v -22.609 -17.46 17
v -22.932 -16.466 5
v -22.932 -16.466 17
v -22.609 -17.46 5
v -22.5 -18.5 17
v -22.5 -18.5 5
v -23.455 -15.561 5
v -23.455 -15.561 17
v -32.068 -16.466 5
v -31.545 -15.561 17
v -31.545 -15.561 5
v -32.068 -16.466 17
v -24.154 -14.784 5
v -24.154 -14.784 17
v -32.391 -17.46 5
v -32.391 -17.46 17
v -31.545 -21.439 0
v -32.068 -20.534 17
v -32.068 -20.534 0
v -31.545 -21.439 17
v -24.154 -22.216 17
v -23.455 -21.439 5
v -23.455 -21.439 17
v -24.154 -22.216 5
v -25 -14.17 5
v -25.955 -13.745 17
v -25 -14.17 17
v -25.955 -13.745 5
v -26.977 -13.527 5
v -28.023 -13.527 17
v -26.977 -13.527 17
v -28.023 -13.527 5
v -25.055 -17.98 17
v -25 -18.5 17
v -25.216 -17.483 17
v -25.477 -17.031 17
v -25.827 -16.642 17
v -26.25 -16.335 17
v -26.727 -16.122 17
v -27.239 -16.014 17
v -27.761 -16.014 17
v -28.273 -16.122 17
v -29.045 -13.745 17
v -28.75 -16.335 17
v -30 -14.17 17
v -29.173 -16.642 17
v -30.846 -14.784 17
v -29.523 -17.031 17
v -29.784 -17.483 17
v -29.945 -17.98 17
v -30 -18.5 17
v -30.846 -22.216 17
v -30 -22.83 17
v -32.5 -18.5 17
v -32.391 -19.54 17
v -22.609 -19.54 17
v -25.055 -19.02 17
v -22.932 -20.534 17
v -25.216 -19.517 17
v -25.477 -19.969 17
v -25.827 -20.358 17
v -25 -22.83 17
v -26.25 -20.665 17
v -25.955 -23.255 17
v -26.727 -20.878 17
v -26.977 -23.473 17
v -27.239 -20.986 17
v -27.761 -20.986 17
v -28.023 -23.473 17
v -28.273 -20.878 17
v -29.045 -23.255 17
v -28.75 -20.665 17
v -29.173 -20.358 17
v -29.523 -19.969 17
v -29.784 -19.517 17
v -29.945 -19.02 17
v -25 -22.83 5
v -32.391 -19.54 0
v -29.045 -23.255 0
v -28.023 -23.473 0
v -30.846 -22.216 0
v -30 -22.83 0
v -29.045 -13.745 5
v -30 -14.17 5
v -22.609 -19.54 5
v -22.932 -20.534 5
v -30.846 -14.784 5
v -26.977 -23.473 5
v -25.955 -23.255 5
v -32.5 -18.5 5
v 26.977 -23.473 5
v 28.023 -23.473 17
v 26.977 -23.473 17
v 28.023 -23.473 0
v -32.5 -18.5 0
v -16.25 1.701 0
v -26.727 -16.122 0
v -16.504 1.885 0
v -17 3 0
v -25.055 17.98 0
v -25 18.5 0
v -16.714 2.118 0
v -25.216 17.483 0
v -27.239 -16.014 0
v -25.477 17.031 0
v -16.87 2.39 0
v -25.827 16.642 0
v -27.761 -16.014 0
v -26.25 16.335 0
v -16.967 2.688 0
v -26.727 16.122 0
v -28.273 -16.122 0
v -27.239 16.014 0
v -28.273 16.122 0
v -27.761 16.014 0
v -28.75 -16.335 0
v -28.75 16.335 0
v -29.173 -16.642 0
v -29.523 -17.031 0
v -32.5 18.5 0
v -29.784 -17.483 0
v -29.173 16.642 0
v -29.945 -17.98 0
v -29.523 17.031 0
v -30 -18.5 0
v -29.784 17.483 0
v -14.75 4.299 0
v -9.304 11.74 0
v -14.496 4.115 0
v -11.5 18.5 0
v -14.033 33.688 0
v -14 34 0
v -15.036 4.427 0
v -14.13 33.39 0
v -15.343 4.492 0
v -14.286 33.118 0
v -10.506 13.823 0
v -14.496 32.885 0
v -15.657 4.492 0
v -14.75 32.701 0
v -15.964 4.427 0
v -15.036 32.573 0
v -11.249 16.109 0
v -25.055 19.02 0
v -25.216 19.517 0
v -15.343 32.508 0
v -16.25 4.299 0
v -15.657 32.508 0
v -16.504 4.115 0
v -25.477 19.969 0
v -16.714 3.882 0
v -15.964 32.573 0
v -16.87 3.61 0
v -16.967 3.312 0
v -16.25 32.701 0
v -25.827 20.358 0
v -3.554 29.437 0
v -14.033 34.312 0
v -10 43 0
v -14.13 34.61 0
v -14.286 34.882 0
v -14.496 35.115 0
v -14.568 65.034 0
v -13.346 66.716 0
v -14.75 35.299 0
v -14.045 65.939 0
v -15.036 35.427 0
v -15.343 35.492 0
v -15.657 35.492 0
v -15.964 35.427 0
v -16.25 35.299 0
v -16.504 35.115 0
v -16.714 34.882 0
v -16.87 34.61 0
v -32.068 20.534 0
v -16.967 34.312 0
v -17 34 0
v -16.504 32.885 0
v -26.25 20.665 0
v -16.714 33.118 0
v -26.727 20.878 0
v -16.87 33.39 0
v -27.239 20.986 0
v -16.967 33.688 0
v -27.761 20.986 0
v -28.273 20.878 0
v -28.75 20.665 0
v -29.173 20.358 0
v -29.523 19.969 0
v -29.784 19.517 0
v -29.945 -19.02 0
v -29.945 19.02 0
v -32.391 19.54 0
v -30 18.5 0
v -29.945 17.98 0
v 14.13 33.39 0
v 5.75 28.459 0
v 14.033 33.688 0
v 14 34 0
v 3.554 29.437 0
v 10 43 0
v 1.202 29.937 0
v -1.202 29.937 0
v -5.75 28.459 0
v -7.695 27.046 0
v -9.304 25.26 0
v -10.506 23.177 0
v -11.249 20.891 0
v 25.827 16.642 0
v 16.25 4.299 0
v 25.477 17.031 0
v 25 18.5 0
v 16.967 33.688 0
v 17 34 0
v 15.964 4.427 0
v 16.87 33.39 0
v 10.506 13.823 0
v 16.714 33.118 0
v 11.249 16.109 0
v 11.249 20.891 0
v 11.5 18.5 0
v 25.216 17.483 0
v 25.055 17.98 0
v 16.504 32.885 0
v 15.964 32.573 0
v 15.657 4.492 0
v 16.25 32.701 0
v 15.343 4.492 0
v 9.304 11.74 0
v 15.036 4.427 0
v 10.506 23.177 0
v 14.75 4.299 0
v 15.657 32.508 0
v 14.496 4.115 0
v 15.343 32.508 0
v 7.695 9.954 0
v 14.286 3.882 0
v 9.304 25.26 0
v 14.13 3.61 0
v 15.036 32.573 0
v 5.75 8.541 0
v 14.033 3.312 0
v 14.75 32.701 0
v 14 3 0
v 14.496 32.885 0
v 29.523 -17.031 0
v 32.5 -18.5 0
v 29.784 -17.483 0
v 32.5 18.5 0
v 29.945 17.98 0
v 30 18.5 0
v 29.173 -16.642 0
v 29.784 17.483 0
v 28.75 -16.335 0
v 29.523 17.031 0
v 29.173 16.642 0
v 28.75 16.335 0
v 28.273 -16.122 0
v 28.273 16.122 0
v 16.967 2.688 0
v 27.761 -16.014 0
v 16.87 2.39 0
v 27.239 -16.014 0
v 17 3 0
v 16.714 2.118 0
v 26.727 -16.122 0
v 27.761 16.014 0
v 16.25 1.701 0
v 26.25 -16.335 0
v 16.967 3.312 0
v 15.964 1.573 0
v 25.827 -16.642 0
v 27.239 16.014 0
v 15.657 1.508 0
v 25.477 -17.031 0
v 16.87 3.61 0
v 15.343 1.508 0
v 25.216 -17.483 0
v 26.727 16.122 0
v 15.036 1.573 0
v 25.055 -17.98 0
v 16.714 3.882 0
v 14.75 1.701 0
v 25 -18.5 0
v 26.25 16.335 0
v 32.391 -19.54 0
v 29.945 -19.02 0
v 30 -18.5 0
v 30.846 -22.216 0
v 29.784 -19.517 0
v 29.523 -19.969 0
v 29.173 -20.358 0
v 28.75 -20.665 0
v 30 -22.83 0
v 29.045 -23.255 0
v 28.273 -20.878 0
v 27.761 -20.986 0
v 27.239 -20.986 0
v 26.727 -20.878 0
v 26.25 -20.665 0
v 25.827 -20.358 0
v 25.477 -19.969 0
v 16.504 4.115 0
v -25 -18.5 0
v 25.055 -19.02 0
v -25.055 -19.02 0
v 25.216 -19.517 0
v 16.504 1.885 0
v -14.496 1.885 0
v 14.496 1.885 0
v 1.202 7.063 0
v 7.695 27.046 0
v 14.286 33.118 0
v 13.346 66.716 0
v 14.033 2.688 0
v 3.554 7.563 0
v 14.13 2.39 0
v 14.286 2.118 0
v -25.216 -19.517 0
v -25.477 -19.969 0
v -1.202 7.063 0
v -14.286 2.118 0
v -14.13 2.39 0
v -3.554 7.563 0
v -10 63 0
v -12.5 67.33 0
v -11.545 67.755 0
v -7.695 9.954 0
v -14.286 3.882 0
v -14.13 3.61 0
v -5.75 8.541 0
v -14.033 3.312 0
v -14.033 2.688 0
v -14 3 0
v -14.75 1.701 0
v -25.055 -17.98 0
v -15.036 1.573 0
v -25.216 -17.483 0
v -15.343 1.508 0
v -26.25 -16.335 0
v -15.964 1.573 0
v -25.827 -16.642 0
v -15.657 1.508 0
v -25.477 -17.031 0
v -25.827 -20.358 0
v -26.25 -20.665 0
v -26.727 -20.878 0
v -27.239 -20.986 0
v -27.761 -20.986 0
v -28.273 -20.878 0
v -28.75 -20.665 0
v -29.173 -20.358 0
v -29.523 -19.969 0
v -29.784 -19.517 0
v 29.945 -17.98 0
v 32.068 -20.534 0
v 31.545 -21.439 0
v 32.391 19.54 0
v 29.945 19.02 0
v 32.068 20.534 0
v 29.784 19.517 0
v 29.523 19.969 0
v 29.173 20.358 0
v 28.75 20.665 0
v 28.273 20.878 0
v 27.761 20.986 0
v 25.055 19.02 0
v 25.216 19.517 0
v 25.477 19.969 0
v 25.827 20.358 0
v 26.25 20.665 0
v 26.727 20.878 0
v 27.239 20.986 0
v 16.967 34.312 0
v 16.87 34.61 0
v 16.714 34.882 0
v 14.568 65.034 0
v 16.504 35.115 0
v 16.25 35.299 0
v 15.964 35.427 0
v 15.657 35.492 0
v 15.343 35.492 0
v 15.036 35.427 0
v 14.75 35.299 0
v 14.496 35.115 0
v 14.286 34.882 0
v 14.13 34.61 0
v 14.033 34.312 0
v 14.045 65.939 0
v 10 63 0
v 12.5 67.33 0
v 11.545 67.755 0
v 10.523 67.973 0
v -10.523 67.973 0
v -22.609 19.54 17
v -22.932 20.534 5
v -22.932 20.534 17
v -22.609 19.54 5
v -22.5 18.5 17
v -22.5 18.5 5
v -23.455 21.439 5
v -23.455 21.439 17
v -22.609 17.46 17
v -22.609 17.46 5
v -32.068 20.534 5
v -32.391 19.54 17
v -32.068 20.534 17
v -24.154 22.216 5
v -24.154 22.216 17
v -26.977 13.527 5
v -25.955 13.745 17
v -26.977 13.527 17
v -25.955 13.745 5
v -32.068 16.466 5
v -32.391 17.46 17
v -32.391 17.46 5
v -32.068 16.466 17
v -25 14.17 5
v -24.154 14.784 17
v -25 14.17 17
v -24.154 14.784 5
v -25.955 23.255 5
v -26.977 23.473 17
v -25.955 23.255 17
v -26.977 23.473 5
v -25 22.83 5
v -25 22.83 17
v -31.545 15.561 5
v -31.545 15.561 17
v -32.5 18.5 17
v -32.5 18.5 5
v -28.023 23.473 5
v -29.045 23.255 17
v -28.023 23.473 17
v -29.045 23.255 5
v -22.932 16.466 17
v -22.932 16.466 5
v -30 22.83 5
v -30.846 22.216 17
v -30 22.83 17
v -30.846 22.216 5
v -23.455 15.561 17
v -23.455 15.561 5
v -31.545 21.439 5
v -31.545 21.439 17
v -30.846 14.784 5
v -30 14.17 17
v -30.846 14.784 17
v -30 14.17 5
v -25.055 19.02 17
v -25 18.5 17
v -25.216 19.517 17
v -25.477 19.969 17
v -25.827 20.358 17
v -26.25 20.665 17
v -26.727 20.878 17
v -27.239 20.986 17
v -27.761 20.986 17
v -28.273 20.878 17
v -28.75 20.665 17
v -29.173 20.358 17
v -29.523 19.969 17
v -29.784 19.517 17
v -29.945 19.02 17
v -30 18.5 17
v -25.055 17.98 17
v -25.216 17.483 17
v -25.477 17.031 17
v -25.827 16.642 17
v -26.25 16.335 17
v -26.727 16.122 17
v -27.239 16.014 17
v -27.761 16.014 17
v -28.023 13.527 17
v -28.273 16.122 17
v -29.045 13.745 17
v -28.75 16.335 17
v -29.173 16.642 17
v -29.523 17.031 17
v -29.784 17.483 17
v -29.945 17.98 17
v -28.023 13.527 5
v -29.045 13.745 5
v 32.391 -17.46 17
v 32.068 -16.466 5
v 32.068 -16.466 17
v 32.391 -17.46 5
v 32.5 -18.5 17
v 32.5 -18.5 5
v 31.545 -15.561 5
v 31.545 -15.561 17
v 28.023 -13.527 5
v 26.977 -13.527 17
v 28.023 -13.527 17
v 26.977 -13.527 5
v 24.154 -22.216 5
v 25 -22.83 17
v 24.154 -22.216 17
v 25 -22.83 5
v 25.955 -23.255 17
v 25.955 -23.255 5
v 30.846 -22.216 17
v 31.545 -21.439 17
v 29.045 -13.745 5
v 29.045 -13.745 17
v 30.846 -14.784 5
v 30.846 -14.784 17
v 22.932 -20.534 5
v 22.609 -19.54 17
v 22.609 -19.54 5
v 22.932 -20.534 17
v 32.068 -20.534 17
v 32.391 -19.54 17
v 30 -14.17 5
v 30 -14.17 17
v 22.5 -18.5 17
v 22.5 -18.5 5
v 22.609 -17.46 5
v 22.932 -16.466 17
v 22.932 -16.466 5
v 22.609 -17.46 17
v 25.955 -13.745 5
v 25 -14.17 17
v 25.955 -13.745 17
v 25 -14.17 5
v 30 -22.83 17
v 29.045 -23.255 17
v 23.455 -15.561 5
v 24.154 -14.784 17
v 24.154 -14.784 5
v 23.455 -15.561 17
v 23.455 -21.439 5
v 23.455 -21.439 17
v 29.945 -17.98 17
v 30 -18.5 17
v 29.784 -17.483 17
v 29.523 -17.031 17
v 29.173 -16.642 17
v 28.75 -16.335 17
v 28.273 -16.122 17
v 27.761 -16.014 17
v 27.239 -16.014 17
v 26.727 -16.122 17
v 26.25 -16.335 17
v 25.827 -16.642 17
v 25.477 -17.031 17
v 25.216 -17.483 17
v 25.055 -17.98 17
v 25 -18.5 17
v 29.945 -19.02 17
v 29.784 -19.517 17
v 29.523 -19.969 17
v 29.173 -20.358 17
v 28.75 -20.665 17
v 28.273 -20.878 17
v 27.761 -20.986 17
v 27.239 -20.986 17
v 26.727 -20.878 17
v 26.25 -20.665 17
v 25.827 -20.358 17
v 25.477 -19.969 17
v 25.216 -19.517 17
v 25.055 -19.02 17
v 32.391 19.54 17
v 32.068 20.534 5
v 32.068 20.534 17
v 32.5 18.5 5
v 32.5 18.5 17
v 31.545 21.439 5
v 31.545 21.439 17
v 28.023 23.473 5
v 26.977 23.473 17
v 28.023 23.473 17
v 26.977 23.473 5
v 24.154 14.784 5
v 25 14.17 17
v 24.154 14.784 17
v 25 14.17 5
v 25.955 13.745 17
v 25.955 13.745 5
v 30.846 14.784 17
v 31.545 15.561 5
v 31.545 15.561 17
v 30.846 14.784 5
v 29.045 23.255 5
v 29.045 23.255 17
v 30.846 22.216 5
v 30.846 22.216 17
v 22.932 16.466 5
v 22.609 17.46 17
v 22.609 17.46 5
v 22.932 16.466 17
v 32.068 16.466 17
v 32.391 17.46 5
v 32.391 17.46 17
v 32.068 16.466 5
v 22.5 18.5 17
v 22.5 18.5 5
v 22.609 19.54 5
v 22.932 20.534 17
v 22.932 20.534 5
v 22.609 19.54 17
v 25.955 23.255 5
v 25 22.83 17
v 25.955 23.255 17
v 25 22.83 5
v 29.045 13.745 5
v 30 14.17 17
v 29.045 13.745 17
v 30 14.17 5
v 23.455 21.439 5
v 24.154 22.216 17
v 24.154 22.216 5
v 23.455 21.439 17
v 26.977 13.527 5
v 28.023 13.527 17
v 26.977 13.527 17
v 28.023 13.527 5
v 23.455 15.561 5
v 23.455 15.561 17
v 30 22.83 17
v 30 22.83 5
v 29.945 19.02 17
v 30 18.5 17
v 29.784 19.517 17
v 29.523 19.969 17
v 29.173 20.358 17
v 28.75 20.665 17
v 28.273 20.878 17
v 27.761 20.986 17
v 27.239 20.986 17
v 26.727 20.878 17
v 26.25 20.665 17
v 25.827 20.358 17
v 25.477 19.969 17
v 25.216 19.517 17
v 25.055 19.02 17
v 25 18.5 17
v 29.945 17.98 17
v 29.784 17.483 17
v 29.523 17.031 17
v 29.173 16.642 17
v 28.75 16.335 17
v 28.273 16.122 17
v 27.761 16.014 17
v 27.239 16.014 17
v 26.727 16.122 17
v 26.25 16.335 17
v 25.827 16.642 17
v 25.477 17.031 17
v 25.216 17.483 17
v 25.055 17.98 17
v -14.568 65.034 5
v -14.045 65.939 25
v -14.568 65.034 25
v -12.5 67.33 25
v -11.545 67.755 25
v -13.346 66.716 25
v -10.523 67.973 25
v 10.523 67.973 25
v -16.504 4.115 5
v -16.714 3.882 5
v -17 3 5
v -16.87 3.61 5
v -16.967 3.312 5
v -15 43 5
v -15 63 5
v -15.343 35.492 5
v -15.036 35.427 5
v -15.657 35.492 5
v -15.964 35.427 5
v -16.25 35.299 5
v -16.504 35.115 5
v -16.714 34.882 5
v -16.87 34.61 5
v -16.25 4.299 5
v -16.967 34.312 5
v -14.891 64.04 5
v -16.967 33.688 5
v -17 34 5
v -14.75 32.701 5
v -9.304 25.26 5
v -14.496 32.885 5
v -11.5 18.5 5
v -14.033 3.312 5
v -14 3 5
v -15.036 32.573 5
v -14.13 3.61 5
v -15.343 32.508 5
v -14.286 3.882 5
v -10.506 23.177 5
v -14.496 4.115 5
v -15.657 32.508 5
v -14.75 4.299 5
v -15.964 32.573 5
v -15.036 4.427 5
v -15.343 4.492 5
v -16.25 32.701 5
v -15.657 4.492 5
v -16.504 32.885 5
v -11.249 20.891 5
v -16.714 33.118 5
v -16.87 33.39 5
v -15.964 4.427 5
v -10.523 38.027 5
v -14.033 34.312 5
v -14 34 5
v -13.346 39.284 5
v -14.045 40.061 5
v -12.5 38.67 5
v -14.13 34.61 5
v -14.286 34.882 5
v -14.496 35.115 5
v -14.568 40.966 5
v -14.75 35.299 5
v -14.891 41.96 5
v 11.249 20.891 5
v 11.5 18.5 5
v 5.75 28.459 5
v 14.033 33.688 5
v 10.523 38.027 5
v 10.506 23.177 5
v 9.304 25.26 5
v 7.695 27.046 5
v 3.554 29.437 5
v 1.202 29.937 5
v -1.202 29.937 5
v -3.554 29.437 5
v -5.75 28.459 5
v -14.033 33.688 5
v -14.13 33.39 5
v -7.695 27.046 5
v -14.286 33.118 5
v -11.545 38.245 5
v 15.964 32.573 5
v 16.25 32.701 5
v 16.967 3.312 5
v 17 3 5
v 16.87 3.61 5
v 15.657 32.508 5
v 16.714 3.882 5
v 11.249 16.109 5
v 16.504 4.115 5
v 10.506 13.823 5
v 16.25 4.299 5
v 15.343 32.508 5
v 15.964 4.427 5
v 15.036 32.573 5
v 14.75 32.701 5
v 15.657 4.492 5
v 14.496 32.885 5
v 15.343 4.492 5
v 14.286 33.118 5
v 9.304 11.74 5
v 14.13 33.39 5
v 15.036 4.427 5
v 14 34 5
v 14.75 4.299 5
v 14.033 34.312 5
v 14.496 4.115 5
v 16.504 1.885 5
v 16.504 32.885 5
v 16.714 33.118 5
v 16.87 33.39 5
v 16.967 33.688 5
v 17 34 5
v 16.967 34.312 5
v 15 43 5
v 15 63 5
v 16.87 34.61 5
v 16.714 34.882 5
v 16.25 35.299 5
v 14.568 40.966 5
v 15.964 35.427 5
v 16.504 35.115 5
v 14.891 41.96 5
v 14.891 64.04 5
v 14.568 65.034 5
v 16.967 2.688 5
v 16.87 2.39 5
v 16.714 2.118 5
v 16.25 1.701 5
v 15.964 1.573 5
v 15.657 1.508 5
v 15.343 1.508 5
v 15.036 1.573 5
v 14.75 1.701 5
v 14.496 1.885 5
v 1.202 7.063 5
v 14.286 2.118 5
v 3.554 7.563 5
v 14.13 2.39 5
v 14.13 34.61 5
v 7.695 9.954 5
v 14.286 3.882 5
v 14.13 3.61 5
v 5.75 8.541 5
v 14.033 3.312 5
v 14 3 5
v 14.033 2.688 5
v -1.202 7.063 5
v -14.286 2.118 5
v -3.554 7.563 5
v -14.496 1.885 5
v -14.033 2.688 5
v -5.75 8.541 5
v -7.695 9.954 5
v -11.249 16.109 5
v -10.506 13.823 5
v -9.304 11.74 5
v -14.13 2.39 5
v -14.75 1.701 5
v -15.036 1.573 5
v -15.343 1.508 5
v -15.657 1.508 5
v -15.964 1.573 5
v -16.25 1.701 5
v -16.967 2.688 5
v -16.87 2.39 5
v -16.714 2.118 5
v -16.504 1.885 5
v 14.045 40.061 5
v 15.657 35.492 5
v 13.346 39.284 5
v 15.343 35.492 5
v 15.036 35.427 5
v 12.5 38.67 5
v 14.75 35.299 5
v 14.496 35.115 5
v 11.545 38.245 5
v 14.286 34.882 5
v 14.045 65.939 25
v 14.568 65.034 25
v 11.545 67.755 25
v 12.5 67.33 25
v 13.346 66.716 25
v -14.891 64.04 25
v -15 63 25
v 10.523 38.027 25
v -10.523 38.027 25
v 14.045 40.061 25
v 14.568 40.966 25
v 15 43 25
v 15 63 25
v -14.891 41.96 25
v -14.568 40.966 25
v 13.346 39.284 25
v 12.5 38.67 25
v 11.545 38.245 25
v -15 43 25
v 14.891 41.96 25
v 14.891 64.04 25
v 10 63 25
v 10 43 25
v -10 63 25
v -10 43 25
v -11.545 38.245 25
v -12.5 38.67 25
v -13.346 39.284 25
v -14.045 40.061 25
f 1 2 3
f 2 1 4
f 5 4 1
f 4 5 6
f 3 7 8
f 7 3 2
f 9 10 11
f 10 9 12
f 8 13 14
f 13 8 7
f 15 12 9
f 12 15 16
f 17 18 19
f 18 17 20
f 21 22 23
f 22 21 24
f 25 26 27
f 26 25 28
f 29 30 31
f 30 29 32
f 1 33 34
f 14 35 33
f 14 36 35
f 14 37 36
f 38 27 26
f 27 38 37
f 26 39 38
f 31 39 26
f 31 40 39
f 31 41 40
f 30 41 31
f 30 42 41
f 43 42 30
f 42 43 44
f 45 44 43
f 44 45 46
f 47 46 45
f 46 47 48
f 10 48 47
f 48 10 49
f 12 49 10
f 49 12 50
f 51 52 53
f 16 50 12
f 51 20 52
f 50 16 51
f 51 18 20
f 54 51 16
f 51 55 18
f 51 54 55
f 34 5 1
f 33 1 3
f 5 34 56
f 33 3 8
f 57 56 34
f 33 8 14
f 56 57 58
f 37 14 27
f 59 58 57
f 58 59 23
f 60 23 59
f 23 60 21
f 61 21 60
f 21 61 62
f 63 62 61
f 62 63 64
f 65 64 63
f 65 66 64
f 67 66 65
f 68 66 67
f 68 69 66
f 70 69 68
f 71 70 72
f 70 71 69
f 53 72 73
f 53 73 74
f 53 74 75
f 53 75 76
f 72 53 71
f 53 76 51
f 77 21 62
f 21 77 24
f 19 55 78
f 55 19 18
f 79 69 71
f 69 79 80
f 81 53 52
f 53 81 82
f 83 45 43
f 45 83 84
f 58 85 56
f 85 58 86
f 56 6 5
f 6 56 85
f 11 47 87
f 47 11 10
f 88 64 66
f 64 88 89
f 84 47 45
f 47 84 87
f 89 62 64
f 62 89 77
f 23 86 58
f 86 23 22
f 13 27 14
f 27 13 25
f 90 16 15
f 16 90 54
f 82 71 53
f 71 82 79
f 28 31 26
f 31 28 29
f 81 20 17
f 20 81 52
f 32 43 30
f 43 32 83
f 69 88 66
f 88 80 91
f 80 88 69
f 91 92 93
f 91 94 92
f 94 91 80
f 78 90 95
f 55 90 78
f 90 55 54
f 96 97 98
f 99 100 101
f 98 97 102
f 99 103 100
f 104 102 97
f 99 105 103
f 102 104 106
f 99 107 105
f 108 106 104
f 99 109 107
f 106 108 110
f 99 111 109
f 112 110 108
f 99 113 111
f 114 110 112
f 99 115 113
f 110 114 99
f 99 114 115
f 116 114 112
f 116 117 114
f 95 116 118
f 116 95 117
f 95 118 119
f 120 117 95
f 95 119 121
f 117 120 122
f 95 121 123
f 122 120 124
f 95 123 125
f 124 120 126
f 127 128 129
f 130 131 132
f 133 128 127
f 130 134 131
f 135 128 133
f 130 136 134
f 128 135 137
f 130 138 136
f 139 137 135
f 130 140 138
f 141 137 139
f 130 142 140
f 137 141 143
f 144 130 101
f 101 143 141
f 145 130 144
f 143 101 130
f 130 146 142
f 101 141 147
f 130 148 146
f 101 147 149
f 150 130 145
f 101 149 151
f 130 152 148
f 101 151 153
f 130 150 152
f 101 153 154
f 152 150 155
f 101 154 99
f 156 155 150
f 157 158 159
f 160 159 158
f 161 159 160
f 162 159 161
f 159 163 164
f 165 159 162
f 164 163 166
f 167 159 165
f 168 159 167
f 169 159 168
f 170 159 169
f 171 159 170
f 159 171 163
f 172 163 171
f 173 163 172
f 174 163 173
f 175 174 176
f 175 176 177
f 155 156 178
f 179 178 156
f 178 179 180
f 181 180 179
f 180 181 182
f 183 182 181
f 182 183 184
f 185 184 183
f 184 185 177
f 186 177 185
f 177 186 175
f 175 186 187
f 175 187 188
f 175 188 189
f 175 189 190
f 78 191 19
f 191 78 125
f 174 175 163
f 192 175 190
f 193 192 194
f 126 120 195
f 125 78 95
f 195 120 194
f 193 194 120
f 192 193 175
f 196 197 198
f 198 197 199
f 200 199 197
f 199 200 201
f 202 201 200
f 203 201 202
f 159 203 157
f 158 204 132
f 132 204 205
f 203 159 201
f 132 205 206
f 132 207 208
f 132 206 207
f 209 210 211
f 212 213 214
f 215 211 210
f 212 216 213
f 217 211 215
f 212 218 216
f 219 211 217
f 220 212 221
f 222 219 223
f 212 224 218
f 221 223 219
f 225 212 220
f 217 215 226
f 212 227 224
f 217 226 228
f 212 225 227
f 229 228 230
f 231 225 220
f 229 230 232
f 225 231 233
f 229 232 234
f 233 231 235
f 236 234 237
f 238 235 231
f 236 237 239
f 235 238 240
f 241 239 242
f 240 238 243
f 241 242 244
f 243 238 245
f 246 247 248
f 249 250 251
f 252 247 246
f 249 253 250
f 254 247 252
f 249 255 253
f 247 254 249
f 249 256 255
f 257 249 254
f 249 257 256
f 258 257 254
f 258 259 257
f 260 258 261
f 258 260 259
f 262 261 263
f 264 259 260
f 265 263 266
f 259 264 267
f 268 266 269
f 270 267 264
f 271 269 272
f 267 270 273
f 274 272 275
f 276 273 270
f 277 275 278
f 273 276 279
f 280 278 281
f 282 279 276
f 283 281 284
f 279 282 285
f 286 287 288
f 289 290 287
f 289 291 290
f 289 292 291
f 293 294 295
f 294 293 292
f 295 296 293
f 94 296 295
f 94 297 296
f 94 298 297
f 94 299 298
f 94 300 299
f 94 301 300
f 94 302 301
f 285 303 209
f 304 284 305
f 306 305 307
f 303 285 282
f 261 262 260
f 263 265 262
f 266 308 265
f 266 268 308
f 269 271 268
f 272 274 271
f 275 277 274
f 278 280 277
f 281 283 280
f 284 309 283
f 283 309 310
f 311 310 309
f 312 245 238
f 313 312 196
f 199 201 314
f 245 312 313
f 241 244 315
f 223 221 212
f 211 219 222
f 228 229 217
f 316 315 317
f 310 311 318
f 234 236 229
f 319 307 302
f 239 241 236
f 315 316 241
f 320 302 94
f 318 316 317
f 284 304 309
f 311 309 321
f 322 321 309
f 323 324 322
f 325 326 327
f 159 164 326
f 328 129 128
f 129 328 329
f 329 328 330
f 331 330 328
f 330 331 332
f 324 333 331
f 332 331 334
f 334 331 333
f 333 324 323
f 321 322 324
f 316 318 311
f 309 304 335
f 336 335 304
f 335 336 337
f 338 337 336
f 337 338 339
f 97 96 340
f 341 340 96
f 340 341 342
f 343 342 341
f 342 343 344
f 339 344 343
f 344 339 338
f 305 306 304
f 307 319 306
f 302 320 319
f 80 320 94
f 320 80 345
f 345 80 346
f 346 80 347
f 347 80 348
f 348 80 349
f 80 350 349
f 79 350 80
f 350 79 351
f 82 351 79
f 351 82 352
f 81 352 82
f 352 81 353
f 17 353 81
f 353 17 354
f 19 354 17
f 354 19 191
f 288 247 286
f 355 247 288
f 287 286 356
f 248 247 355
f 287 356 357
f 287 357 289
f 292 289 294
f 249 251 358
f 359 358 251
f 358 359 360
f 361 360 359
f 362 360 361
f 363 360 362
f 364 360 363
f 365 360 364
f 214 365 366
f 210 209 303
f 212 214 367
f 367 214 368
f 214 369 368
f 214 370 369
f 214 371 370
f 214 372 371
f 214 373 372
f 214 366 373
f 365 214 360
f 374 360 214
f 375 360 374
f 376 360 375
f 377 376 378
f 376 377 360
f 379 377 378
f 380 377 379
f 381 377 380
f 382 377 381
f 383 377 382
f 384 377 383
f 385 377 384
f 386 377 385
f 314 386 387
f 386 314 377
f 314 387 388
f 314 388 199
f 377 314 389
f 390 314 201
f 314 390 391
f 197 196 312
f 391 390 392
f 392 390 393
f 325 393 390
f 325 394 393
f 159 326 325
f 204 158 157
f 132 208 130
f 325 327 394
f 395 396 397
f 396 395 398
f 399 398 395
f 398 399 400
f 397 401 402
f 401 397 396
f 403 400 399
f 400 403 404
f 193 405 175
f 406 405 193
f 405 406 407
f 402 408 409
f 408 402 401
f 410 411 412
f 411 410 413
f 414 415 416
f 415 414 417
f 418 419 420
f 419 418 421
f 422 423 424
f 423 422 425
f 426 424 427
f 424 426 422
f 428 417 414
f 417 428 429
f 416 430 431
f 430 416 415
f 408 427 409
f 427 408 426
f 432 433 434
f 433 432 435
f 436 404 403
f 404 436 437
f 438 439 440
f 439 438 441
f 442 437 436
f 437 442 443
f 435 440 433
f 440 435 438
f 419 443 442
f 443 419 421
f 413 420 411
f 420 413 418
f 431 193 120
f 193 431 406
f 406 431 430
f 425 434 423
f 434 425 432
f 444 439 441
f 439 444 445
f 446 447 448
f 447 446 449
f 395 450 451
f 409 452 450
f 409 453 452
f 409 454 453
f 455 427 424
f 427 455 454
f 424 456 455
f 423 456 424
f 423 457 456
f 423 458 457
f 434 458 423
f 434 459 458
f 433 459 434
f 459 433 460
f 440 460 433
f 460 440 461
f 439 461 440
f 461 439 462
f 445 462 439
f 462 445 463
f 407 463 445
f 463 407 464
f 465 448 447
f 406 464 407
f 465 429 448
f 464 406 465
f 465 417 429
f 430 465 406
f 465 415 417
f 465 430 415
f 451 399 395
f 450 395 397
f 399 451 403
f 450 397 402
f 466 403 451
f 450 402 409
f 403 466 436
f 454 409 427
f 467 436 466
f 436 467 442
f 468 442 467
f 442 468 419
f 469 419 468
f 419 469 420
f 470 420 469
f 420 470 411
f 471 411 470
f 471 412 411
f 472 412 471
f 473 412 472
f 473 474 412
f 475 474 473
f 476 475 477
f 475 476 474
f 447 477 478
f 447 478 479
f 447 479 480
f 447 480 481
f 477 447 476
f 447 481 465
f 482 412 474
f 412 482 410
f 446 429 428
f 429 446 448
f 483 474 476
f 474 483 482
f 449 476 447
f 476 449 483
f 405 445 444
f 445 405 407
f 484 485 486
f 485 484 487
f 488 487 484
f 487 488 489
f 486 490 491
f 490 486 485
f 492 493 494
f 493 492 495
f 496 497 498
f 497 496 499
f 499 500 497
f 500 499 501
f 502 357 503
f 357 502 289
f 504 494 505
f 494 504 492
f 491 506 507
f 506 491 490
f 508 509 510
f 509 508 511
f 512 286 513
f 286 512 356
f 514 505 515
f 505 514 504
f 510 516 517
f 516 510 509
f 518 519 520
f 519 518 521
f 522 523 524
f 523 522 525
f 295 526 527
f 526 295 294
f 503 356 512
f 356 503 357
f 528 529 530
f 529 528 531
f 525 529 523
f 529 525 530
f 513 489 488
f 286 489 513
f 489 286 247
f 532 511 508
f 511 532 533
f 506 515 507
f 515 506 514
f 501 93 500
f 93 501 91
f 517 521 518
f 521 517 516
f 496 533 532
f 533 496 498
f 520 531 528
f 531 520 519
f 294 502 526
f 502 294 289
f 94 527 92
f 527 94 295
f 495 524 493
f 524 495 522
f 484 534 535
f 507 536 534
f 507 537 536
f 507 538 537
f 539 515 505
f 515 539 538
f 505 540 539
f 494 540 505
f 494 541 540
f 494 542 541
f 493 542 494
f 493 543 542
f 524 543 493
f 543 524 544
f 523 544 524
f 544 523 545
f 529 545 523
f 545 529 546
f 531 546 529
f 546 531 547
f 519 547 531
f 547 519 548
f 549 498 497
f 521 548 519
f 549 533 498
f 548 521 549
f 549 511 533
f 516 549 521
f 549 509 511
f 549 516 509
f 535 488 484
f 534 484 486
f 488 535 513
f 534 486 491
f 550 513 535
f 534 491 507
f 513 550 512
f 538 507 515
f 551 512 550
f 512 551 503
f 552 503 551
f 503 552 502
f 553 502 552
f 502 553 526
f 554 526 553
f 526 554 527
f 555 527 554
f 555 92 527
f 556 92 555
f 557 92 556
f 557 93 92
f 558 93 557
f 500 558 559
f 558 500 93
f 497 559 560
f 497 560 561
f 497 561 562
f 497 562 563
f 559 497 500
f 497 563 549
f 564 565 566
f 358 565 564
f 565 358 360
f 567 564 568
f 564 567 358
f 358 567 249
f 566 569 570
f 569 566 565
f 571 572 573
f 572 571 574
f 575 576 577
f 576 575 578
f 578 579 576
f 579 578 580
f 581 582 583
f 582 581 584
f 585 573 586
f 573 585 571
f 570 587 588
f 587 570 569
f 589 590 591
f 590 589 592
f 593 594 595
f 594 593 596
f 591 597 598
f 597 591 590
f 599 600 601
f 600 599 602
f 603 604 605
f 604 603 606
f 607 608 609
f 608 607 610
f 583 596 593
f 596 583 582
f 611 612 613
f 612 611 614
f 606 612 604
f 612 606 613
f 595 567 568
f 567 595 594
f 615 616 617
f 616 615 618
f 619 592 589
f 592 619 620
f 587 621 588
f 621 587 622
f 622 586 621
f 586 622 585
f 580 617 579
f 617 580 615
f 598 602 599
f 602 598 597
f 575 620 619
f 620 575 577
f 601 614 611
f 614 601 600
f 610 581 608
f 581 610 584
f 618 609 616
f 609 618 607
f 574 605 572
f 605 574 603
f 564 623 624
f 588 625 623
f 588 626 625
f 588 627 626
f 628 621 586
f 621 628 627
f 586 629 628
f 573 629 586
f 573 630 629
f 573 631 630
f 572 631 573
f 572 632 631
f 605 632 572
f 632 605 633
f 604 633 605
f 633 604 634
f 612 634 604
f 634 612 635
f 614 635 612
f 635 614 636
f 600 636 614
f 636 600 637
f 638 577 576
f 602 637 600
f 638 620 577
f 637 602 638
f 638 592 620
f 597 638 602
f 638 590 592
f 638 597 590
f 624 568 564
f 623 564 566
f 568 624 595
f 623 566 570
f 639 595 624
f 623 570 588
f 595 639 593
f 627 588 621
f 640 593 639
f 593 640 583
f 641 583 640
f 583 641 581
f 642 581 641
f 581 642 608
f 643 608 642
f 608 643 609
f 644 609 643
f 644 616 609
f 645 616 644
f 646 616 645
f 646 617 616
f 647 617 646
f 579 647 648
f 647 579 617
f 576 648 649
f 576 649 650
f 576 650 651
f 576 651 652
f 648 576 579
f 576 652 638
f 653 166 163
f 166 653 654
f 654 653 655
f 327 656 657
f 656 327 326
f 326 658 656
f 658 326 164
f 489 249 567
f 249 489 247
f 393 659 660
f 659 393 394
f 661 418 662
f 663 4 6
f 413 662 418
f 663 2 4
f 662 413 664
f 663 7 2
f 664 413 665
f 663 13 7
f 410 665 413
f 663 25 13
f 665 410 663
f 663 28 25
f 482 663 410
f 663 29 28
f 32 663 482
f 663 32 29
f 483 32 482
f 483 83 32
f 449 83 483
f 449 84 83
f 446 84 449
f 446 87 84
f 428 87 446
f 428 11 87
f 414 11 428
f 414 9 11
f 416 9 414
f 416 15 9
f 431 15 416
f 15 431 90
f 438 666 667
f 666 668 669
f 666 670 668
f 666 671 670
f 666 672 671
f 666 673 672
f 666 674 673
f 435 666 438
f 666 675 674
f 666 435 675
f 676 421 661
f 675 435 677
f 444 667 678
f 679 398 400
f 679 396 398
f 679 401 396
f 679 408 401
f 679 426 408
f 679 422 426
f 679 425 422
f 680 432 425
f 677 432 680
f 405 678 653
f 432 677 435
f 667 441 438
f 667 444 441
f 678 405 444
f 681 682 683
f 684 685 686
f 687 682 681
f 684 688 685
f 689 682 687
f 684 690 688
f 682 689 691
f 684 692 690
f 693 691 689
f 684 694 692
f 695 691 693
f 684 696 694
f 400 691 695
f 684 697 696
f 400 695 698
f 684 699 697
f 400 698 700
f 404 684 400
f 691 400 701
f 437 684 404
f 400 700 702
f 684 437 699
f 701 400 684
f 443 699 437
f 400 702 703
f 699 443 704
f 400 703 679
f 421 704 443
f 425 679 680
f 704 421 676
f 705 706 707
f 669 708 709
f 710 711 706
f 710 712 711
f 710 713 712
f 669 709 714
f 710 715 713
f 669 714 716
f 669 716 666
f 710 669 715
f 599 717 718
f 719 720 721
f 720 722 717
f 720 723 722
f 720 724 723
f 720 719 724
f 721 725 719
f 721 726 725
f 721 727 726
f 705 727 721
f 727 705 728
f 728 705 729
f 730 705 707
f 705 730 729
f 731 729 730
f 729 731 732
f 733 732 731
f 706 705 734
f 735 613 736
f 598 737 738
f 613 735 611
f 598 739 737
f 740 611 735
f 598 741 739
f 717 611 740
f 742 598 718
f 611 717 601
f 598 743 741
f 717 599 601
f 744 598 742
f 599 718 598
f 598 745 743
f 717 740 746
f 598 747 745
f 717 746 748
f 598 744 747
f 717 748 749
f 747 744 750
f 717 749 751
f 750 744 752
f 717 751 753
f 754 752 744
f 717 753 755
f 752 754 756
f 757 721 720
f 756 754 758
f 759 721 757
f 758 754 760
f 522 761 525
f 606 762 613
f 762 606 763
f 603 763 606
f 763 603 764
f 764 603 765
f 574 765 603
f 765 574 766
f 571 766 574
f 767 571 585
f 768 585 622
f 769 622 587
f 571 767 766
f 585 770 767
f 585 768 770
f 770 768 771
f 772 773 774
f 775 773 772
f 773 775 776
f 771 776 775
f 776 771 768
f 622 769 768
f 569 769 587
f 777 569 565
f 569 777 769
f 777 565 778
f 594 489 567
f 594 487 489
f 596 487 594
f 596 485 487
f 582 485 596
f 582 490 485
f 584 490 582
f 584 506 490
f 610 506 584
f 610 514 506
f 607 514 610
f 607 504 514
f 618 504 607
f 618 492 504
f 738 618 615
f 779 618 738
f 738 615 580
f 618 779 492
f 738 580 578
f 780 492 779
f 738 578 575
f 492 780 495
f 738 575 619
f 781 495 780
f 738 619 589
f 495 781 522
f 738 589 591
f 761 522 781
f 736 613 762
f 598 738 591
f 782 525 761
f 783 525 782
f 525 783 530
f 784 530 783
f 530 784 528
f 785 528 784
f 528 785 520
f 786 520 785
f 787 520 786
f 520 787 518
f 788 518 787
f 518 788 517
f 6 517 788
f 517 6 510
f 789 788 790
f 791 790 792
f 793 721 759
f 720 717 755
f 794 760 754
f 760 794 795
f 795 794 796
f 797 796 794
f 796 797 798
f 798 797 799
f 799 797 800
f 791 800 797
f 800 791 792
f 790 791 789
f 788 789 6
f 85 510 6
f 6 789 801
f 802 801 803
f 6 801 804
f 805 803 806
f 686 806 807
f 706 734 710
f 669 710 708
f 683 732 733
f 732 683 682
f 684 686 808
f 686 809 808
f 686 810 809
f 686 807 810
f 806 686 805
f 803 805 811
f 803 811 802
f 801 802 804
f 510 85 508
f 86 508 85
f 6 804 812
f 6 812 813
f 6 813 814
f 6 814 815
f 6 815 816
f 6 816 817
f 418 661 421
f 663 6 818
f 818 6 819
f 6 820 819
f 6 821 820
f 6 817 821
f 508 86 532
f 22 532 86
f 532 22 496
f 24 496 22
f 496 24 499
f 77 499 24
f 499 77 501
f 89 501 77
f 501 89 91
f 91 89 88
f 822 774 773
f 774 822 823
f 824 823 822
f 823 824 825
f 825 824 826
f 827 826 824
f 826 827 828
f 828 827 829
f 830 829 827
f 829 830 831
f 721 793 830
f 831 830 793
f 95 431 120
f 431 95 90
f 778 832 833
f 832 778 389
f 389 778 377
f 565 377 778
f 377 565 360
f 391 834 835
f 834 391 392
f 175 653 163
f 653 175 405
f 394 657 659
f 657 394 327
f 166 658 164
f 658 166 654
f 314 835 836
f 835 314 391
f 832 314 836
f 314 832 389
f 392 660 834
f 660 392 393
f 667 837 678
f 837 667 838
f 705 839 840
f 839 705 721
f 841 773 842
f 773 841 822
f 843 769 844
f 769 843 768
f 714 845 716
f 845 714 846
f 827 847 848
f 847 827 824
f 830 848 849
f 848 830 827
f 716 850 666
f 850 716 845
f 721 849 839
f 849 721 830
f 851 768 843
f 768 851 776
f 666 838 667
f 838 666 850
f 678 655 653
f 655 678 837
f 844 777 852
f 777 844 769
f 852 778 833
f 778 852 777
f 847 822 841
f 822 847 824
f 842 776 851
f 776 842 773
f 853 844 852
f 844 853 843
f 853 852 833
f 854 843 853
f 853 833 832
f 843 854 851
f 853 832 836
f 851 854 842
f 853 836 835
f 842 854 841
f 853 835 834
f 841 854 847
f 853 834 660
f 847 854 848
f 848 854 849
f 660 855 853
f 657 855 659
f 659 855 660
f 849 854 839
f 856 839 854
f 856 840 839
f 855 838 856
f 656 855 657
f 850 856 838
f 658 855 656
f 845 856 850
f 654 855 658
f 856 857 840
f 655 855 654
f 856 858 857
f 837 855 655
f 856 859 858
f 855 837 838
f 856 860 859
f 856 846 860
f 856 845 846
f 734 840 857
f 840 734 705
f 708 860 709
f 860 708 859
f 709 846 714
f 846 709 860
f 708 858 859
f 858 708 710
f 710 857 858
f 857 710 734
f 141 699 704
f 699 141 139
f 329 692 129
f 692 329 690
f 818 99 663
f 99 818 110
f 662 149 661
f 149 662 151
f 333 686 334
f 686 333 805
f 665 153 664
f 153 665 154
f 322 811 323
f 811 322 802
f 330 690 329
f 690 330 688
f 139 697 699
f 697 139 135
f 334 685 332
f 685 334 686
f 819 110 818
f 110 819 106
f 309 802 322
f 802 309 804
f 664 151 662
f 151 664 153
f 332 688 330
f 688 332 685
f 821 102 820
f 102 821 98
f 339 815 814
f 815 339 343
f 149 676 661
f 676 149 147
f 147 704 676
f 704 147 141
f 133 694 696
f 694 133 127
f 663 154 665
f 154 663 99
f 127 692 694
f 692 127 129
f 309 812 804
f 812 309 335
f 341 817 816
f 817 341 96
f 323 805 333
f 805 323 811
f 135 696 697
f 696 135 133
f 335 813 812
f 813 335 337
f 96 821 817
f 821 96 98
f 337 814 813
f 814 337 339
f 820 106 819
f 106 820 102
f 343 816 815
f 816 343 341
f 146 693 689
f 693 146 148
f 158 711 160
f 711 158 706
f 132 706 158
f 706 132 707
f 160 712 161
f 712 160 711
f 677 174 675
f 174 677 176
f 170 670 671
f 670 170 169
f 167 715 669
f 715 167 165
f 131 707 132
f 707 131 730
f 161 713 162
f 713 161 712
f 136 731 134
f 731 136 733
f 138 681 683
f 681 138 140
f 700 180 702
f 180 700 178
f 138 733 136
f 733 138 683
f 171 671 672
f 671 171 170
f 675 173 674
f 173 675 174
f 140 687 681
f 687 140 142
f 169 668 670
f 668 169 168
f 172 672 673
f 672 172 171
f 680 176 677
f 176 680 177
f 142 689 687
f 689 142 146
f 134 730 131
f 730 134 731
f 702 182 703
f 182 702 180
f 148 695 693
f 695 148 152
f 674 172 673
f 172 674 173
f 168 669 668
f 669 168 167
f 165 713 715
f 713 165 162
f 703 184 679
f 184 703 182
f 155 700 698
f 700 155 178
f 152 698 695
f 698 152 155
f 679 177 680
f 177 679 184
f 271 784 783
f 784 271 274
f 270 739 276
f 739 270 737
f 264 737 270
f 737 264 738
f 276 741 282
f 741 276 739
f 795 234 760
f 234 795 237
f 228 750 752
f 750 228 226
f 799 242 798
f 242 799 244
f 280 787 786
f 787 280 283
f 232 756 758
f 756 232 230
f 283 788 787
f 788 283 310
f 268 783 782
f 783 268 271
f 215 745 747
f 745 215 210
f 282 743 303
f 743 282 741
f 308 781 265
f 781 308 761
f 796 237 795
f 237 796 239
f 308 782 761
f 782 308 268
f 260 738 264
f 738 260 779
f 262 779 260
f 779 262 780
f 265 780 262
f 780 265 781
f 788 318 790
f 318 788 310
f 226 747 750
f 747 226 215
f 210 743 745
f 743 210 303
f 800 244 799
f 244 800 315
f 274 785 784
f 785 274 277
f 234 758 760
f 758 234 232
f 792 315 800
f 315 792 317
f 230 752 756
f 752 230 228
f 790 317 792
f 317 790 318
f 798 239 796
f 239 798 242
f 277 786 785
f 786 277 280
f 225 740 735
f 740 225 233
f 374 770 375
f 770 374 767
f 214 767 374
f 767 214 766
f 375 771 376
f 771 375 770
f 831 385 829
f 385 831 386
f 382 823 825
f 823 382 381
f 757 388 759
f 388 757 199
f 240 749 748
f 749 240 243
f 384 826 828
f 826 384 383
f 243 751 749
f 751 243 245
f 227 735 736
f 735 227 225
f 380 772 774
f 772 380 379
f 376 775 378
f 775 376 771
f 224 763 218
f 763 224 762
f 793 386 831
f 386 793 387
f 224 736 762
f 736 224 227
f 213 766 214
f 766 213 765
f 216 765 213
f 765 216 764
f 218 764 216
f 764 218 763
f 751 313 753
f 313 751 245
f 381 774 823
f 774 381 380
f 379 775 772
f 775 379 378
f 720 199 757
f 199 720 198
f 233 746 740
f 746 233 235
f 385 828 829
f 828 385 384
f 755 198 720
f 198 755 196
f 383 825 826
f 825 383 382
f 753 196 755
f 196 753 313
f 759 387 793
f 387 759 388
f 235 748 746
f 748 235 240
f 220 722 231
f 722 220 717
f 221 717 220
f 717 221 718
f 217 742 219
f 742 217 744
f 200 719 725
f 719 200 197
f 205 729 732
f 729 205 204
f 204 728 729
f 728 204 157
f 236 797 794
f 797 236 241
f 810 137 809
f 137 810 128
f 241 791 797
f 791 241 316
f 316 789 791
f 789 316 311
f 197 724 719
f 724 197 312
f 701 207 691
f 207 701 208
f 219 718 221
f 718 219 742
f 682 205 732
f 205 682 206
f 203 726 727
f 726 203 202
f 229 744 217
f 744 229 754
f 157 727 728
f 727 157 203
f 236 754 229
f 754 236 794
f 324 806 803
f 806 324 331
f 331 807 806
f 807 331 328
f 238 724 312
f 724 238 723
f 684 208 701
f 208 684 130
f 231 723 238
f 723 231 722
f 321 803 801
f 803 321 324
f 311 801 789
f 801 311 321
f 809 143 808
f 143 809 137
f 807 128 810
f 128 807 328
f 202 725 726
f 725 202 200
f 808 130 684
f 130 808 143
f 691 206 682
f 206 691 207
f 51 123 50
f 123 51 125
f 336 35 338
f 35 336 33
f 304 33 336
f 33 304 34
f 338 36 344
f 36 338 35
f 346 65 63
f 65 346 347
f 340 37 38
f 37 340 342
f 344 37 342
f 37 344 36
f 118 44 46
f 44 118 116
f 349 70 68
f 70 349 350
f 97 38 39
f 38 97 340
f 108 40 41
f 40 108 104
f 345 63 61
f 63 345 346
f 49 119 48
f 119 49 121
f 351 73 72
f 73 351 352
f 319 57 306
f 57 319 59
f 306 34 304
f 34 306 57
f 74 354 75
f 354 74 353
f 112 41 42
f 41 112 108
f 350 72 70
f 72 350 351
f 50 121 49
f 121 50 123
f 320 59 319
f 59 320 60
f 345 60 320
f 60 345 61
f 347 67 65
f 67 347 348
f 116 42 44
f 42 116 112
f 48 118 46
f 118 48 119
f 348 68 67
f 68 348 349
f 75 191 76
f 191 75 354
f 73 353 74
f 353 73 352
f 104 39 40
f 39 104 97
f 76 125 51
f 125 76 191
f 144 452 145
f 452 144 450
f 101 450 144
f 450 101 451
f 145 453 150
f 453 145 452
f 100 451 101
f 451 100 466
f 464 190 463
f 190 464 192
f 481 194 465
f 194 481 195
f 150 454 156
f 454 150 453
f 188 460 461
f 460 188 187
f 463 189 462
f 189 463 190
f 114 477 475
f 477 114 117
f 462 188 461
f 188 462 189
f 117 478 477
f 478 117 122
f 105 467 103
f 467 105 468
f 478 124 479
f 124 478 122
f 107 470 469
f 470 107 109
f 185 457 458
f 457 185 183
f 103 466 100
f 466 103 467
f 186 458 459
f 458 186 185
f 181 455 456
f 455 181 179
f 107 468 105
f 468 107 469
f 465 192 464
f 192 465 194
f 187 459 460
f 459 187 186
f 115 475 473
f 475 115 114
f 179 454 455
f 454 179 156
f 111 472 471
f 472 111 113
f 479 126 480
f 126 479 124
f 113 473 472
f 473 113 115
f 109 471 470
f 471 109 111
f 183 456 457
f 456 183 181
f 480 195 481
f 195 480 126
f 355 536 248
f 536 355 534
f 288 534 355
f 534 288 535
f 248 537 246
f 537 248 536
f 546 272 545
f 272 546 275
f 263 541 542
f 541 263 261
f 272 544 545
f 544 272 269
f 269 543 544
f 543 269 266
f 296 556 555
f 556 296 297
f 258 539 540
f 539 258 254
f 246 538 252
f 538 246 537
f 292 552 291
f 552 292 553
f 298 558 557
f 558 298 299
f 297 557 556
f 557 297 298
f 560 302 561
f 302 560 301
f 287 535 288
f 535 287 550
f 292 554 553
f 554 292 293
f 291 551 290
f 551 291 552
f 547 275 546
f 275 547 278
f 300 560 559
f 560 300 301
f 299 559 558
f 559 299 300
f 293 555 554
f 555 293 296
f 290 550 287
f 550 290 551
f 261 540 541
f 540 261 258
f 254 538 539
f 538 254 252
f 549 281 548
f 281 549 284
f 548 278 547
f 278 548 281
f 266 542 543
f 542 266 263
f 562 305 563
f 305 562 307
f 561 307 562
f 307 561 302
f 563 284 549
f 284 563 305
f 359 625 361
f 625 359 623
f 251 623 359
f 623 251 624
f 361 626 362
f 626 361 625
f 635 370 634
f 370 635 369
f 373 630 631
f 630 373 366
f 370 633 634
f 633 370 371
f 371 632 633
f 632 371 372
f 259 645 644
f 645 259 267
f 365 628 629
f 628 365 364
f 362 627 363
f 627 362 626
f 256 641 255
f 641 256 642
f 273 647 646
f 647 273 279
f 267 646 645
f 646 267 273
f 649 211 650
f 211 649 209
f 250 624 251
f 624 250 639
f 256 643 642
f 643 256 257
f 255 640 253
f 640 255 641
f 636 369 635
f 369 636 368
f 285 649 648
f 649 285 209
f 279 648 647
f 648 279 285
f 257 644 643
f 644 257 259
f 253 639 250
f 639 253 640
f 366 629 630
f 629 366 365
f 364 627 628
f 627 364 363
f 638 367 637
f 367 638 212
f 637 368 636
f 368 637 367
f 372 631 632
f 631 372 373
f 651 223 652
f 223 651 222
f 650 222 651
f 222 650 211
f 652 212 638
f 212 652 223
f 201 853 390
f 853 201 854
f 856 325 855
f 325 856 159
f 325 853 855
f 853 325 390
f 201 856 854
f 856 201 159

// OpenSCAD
WIDTH = 65;
HEIGHT = 90;
THICKNESS = 5;
CORNER_DIA = 10;

MOTOR_WIDTH = 42;
MOTOR_MOUNT_SPACING = 31;
MOTOR_MOUNT_DIA = 3;
MOTOR_SHAFT_DIA = 23;

PULLEY_MOUNT_WIDTH = 55;
PULLEY_MOUNT_HEIGHT = 37;
PULLEY_MOUNT_DIA = 5;
PULLEY_SHAFT_LEN = 12;
PULLEY_SHAFT_DIA = 10;
PULLEY_MOTOR_OFFSET = PULLEY_MOUNT_HEIGHT/2;

BEAM_WIDTH = 20;
BEAM_SUPPORT_LEN = 20;
BEAM_SUPPORT_THICKNESS = 5;


$fn = 30;

module rounded_cube(width, height, thickness, corner_dia) {
    hull() {
        for(i = [-1, 1]) {
            for(j = [-1, 1]) {
                translate([i * (width - corner_dia)/2, j * (height - corner_dia)/2, 0])
                cylinder(d = corner_dia, h = thickness);
            }
        }
    }       
}

module plate() {
    h = PULLEY_MOUNT_HEIGHT+PULLEY_SHAFT_DIA;
    bw = BEAM_WIDTH + 2 * BEAM_SUPPORT_THICKNESS;
    hull() {
        rounded_cube(WIDTH, h, THICKNESS, CORNER_DIA);
        translate([0, (HEIGHT-PULLEY_MOUNT_HEIGHT), 0])
        rounded_cube(bw, bw, THICKNESS, CORNER_DIA);
        translate([0, PULLEY_MOTOR_OFFSET, 0])
        rounded_cube(MOTOR_WIDTH, MOTOR_WIDTH, THICKNESS, CORNER_DIA);
    }   
}

module motor_mount_pos() {
    rounded_cube(MOTOR_WIDTH, MOTOR_WIDTH, THICKNESS, CORNER_DIA);
}

module motor_mount_neg() {
    union() {
        for(i = [-1, 1]) {
            for(j = [-1, 1]) {
                translate([i * MOTOR_MOUNT_SPACING/2, j * MOTOR_MOUNT_SPACING/2, 0])
                cylinder(d = MOTOR_MOUNT_DIA, h = THICKNESS);
            }
        }
        cylinder(d = MOTOR_SHAFT_DIA, h = THICKNESS);
    }
}

module pulley_mount_pos() {
    for(i = [-1, 1]) {
        for(j = [-1, 1]) {
            translate([i * PULLEY_MOUNT_WIDTH/2, j * PULLEY_MOUNT_HEIGHT/2, 0])
            cylinder(d = PULLEY_SHAFT_DIA, h = PULLEY_SHAFT_LEN + THICKNESS);
        }
    }
}

module pulley_mount_neg() {
    for(i = [-1, 1]) {
        for(j = [-1, 1]) {
            translate([i * PULLEY_MOUNT_WIDTH/2, j * PULLEY_MOUNT_HEIGHT/2, 0])
            cylinder(d = PULLEY_MOUNT_DIA, h = PULLEY_SHAFT_LEN + THICKNESS);
        }
    }   
}

module beam_mount_pos() {
    bw = BEAM_WIDTH + 2 * BEAM_SUPPORT_THICKNESS;
    rounded_cube(bw, bw, THICKNESS + BEAM_SUPPORT_LEN, CORNER_DIA);
}

module beam_mount_neg() {
    bw = BEAM_WIDTH;
    translate([-bw/2, -bw/2, 0])
    cube(size = [bw, bw, THICKNESS + BEAM_SUPPORT_LEN]);    
}

difference() {
    union() {
        plate();
        translate([0, PULLEY_MOTOR_OFFSET, 0])
        motor_mount_pos();
        pulley_mount_pos();
        translate([0, (HEIGHT-PULLEY_MOUNT_HEIGHT), 0])
        beam_mount_pos();
    }
    translate([0, PULLEY_MOTOR_OFFSET, 0])
    motor_mount_neg();
    pulley_mount_neg();
    translate([0, (HEIGHT-PULLEY_MOUNT_HEIGHT), 0])
    beam_mount_neg();
}
